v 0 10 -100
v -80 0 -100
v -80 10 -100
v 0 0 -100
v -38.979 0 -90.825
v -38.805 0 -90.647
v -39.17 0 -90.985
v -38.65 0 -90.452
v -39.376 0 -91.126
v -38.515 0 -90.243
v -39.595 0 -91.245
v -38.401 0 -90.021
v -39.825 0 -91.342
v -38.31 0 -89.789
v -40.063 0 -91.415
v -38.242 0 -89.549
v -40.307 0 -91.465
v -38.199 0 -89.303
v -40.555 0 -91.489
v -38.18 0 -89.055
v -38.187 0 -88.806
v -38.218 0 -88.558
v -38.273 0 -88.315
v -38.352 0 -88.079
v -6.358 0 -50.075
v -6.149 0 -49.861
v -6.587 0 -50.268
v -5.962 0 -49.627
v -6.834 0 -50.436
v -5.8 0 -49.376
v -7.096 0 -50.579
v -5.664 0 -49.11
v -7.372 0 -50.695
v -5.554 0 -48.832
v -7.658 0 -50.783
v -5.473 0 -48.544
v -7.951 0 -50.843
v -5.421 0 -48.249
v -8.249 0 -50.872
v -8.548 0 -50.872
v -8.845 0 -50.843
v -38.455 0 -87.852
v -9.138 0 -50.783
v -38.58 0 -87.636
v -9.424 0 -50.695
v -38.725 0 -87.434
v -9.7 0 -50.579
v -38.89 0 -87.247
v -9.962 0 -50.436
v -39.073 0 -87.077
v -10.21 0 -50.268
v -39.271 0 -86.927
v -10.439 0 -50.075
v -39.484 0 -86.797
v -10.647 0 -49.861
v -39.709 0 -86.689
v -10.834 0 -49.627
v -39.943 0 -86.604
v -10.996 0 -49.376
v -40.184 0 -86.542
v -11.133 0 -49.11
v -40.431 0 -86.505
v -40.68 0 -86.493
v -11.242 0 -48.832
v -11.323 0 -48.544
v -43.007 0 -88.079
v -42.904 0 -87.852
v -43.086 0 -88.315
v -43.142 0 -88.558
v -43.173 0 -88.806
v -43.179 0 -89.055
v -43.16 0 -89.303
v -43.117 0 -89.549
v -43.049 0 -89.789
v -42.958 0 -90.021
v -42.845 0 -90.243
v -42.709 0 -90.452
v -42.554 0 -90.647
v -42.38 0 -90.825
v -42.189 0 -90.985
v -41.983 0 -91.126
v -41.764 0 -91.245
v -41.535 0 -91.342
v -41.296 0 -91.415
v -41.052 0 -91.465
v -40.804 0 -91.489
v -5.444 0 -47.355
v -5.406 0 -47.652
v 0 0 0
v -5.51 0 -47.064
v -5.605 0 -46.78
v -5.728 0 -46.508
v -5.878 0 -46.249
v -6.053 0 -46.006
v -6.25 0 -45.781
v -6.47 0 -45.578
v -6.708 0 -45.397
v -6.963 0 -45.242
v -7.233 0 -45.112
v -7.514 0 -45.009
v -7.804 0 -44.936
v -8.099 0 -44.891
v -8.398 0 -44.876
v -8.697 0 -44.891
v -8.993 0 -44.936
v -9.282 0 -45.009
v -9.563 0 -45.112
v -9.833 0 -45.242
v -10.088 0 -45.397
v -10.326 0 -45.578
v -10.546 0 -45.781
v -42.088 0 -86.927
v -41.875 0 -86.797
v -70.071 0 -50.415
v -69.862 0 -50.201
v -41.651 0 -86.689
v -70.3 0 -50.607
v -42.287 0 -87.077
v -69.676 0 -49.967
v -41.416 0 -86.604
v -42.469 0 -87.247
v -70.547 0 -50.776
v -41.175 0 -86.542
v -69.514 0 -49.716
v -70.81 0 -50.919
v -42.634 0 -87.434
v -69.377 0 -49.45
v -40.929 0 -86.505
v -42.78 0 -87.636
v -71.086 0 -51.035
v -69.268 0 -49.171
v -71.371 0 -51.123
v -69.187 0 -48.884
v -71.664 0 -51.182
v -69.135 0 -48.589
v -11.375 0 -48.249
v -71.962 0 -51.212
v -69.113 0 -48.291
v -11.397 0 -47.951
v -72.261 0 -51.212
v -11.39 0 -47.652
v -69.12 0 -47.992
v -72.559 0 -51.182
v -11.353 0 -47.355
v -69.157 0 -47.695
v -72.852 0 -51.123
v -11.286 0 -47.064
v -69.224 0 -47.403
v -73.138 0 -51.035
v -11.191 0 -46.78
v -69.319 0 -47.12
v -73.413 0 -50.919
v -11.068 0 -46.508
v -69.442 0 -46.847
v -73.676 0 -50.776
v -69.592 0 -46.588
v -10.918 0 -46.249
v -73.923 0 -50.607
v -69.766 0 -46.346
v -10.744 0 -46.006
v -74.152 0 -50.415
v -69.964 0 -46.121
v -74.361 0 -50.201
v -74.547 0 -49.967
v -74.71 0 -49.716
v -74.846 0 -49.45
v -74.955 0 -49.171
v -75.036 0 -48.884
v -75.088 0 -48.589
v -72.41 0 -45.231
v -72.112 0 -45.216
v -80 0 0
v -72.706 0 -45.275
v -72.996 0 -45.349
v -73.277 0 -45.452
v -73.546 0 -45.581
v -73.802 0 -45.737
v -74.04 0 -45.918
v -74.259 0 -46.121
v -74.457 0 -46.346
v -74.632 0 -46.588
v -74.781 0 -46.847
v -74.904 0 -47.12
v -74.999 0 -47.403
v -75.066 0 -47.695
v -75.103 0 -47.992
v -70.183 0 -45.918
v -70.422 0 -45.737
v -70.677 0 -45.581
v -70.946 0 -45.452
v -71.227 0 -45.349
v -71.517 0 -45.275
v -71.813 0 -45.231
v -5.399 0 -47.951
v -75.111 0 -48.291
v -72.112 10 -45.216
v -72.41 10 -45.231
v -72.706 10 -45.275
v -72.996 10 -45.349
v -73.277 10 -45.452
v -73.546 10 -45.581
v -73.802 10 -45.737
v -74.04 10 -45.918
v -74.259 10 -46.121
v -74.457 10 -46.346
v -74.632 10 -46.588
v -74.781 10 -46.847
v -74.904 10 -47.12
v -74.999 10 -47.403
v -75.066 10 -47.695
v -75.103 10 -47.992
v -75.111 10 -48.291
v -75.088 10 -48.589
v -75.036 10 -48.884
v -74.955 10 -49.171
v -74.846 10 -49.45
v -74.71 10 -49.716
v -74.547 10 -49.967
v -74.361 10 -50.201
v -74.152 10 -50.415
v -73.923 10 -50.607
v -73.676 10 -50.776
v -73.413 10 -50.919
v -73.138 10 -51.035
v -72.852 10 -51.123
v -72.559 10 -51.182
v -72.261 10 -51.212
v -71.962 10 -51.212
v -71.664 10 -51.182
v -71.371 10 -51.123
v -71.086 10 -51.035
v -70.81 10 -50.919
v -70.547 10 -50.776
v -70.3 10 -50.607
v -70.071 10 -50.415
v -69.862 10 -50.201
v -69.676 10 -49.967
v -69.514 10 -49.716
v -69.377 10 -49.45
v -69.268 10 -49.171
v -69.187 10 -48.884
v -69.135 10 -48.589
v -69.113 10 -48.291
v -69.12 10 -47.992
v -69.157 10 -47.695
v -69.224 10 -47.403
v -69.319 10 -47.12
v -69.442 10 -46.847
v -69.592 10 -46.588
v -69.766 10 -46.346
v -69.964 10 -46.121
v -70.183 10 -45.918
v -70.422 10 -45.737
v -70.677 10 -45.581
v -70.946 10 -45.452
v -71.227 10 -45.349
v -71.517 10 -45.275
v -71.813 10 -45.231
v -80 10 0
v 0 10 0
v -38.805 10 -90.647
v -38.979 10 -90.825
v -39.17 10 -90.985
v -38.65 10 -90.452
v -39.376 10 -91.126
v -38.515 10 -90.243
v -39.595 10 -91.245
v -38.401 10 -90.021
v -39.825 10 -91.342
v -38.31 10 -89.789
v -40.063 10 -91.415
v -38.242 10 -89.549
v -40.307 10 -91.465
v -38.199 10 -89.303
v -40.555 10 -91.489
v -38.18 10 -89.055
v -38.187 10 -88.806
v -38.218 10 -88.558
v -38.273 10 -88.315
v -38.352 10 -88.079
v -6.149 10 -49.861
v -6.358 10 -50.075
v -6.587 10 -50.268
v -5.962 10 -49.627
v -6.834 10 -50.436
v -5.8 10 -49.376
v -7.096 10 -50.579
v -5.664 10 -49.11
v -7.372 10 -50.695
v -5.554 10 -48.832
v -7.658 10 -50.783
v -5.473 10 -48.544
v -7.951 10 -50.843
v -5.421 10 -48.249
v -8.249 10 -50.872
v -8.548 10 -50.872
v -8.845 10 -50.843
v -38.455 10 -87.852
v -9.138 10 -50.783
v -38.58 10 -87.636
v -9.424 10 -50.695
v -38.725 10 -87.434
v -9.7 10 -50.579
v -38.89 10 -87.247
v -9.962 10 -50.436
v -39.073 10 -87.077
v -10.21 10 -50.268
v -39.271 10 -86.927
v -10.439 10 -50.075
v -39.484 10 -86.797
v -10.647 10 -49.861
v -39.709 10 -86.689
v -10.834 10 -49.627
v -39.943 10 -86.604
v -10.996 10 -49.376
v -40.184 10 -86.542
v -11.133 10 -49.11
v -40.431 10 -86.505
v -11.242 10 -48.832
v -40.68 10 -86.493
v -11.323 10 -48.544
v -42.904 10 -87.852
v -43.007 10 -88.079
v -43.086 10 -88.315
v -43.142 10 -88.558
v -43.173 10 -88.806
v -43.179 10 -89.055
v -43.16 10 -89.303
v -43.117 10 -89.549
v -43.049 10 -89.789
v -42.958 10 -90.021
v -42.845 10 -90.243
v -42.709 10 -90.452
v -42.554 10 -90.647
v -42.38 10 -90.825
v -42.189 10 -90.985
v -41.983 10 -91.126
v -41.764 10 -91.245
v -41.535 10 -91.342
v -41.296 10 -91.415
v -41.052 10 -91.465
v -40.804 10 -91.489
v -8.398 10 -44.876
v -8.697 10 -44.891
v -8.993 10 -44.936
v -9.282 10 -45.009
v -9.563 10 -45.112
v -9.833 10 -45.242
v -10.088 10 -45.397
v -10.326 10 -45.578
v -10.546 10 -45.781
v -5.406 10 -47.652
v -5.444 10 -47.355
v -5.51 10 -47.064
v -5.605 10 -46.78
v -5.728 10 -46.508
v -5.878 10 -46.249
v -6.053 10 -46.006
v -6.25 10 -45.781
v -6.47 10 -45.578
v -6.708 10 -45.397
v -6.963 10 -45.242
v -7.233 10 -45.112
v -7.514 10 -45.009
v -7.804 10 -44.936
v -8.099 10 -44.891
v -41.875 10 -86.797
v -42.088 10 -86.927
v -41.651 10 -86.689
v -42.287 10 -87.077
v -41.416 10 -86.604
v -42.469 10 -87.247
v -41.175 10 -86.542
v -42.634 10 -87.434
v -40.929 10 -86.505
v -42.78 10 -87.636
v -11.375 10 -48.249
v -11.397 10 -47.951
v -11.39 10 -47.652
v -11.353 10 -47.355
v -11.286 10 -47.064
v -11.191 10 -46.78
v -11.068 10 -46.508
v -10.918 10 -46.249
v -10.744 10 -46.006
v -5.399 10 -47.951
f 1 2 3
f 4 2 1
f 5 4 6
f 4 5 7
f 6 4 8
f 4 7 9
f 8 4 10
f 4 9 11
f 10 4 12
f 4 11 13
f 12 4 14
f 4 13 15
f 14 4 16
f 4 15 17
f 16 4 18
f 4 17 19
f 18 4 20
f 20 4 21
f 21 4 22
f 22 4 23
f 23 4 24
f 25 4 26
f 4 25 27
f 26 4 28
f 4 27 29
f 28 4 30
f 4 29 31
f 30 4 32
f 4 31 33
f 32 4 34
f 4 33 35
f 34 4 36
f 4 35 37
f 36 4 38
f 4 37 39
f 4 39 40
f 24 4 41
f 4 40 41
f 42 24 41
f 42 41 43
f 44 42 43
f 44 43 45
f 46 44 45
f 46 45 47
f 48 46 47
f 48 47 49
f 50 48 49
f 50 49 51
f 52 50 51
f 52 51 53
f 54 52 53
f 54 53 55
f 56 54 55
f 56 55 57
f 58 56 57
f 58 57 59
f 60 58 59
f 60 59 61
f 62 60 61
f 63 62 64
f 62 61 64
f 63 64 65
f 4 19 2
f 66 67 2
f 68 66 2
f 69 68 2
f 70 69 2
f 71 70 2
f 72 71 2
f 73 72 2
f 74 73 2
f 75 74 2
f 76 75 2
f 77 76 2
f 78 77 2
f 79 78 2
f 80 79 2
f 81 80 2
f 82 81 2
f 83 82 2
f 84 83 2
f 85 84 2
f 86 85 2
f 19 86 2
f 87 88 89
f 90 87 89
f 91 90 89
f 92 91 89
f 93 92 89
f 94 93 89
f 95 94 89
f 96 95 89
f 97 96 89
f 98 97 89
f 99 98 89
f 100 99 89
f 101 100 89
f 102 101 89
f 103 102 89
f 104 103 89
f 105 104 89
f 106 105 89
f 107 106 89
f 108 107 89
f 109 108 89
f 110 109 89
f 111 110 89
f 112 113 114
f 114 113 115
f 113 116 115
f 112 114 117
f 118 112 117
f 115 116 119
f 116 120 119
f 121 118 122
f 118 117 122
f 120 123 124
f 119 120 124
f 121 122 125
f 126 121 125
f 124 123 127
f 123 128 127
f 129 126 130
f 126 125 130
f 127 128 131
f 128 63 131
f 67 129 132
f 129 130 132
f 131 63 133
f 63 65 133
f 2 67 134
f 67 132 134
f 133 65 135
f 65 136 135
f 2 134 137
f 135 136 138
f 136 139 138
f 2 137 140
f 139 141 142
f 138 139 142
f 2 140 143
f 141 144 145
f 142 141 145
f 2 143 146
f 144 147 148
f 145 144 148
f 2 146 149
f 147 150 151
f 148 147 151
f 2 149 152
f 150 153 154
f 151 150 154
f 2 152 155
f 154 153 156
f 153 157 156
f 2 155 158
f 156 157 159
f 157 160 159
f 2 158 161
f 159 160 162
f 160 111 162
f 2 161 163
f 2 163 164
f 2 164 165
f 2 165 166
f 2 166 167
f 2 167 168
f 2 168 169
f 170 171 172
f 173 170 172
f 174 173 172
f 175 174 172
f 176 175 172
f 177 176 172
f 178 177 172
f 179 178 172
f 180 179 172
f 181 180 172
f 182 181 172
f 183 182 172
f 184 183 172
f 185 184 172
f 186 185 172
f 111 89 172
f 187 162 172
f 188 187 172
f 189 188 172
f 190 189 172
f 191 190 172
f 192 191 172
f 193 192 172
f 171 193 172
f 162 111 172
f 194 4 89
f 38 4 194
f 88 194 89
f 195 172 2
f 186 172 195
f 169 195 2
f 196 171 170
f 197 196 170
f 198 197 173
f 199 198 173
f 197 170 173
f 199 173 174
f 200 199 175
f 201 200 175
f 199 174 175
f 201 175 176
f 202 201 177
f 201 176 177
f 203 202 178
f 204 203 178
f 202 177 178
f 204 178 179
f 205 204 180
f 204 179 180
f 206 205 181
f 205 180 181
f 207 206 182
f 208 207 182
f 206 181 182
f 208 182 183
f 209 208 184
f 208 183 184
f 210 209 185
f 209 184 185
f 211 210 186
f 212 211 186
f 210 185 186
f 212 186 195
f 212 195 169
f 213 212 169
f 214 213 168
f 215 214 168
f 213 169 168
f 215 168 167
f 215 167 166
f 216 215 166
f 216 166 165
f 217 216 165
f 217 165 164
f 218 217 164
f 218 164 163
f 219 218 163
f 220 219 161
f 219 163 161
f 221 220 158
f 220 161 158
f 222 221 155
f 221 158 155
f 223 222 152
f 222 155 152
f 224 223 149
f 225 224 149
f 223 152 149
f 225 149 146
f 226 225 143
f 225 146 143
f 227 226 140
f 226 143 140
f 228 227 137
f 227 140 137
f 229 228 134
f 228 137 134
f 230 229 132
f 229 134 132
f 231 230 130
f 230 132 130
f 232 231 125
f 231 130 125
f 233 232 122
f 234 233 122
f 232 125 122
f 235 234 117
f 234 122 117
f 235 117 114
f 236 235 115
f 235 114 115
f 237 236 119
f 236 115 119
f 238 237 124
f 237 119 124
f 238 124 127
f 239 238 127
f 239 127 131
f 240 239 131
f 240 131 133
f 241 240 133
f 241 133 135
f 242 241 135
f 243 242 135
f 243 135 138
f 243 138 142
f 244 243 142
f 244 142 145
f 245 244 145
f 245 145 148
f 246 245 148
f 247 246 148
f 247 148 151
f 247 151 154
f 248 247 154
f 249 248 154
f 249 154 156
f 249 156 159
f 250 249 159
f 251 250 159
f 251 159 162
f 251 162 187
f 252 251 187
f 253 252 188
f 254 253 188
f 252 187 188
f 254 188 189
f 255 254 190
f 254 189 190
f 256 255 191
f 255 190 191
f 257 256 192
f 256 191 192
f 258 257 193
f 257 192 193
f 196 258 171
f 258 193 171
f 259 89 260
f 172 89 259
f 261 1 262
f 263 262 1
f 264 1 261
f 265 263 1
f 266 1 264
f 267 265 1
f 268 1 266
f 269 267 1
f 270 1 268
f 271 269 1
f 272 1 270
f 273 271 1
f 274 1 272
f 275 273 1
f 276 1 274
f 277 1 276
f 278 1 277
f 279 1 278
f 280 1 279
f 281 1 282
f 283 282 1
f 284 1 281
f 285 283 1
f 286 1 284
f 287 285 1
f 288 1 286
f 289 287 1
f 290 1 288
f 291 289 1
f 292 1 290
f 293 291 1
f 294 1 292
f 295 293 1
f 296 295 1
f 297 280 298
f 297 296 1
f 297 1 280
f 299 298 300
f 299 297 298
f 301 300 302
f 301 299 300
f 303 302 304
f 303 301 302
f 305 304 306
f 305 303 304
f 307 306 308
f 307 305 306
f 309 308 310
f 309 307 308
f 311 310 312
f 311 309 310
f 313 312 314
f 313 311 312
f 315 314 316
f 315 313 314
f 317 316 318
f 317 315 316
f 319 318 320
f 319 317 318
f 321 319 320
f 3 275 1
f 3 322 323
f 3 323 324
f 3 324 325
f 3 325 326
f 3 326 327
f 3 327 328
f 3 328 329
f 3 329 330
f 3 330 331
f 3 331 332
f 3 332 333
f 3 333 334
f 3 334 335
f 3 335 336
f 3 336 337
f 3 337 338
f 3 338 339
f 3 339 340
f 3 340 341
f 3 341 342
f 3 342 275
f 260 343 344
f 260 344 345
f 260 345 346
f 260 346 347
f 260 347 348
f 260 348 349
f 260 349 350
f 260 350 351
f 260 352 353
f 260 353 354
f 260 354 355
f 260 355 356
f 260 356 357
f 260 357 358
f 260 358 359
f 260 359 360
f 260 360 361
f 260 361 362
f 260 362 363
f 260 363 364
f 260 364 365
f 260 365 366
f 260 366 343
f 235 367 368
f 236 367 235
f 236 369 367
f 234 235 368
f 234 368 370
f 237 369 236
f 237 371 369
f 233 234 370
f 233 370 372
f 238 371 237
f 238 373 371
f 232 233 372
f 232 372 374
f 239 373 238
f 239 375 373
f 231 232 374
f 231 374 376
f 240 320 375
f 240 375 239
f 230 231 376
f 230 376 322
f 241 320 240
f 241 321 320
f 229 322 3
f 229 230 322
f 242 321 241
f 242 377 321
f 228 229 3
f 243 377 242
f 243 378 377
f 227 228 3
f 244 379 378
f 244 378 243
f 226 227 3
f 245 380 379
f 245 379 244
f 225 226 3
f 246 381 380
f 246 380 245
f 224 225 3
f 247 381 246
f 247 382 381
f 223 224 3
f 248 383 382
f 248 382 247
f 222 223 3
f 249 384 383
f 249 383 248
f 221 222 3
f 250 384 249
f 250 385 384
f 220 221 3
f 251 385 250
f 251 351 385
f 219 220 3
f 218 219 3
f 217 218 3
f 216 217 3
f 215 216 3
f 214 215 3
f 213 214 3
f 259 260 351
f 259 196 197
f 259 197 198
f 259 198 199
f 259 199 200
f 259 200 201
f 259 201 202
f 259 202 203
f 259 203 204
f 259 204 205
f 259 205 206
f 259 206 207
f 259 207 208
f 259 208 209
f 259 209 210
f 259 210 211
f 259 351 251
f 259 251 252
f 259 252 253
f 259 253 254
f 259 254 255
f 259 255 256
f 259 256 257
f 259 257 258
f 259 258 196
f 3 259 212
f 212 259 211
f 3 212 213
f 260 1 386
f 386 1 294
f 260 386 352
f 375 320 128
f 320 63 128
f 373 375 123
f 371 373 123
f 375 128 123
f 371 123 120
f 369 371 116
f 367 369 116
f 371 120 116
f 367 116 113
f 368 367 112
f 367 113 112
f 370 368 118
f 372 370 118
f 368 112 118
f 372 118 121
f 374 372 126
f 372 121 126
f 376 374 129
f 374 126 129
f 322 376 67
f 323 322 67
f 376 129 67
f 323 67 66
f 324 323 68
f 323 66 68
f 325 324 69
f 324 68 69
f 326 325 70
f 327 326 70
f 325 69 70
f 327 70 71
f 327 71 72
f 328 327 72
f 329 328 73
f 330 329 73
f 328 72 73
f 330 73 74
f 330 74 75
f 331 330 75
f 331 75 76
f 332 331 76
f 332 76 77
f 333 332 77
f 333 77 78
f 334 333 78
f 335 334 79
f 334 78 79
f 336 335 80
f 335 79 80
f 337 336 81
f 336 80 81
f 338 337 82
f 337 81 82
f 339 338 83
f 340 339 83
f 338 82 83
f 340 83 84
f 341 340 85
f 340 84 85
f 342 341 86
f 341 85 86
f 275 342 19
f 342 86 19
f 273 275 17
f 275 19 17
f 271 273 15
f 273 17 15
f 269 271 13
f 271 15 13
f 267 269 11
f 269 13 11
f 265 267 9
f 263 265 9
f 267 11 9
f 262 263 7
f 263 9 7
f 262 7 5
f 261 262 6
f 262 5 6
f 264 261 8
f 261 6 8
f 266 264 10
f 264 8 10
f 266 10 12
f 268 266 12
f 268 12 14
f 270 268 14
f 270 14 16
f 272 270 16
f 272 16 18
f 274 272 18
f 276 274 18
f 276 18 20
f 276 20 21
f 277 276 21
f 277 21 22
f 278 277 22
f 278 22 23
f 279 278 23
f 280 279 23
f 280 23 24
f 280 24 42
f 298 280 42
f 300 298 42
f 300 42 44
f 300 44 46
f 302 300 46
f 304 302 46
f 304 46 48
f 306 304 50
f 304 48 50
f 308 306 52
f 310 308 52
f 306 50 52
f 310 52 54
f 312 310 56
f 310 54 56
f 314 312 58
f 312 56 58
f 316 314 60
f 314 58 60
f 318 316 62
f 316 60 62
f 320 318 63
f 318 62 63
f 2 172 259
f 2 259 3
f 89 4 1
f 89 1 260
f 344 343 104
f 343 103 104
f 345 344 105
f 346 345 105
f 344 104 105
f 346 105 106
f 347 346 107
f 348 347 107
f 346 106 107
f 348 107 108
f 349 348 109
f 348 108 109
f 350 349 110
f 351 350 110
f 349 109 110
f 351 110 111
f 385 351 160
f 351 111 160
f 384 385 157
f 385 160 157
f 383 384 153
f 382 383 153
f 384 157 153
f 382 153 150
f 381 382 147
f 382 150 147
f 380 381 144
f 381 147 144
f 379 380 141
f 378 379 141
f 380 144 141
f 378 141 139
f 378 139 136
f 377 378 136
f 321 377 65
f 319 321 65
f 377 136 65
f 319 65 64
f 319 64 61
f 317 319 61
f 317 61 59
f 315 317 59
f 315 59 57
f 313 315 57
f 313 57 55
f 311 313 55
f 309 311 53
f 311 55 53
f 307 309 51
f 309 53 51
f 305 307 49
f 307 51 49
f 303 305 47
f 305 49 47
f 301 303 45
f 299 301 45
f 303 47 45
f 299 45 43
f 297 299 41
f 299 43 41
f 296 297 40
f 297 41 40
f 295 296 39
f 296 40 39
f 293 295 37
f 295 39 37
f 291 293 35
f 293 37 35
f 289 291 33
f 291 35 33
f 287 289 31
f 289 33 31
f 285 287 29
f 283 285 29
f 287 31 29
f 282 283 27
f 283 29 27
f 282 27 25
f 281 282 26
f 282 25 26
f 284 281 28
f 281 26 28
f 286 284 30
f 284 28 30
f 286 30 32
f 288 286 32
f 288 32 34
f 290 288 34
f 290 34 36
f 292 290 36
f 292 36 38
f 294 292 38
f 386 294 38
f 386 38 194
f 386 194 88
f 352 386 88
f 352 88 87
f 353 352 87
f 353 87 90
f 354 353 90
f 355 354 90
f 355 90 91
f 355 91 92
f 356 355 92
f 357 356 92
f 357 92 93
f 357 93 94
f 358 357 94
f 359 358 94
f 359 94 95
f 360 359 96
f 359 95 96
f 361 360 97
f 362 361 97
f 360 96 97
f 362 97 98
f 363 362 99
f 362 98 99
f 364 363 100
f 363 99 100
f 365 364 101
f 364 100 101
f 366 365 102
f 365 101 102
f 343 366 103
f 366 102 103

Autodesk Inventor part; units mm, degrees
ref_plane "YZ Plane" through (0, 0, 0) normal (1, 0, 0) x (0, 1, 0)
ref_plane "XZ Plane" through (0, 0, 0) normal (0, 1, 0) x (-1, 0, 0)
ref_plane "XY Plane" through (0, 0, 0) normal (0, 0, 1) x (1, 0, 0)
sketch "Sketch1" plane through (0, 0, 0) normal (0, 1, 0) x (-1, 0, 0)
  line L0 (0, 0) -> (80, 0)
  line L1 (80, 0) -> (80, -100)
  line L2 (80, -100) -> (0, -100)
  line L3 (0, -100) -> (0, 0)
  dimension "d0" = 80
  dimension "d1" = 100
extrude "Extrusion1" add sketch "Sketch1" along normal blind 10
sketch "Sketch2" plane through (0, 10, 0) normal (0, 1, 0) x (1, 0, 0)
  point P0 (0, 0)
  point P1 (-40.6796, 88.9926)
hole "Hole1" at (-40.6796, 10, -88.9926) direction (0, -1, 0) diameter 5 end through all
sketch "Sketch3" plane through (0, 10, 0) normal (0, 1, 0) x (1, 0, 0)
  point P0 (0, 0)
  point P1 (-72.1116, 48.216)
  point P2 (-8.3981, 47.8762)
hole "Hole2" at (-72.1116, 10, -48.216) at (-8.3981, 10, -47.8762) direction (0, -1, 0) diameter 6 end through all
